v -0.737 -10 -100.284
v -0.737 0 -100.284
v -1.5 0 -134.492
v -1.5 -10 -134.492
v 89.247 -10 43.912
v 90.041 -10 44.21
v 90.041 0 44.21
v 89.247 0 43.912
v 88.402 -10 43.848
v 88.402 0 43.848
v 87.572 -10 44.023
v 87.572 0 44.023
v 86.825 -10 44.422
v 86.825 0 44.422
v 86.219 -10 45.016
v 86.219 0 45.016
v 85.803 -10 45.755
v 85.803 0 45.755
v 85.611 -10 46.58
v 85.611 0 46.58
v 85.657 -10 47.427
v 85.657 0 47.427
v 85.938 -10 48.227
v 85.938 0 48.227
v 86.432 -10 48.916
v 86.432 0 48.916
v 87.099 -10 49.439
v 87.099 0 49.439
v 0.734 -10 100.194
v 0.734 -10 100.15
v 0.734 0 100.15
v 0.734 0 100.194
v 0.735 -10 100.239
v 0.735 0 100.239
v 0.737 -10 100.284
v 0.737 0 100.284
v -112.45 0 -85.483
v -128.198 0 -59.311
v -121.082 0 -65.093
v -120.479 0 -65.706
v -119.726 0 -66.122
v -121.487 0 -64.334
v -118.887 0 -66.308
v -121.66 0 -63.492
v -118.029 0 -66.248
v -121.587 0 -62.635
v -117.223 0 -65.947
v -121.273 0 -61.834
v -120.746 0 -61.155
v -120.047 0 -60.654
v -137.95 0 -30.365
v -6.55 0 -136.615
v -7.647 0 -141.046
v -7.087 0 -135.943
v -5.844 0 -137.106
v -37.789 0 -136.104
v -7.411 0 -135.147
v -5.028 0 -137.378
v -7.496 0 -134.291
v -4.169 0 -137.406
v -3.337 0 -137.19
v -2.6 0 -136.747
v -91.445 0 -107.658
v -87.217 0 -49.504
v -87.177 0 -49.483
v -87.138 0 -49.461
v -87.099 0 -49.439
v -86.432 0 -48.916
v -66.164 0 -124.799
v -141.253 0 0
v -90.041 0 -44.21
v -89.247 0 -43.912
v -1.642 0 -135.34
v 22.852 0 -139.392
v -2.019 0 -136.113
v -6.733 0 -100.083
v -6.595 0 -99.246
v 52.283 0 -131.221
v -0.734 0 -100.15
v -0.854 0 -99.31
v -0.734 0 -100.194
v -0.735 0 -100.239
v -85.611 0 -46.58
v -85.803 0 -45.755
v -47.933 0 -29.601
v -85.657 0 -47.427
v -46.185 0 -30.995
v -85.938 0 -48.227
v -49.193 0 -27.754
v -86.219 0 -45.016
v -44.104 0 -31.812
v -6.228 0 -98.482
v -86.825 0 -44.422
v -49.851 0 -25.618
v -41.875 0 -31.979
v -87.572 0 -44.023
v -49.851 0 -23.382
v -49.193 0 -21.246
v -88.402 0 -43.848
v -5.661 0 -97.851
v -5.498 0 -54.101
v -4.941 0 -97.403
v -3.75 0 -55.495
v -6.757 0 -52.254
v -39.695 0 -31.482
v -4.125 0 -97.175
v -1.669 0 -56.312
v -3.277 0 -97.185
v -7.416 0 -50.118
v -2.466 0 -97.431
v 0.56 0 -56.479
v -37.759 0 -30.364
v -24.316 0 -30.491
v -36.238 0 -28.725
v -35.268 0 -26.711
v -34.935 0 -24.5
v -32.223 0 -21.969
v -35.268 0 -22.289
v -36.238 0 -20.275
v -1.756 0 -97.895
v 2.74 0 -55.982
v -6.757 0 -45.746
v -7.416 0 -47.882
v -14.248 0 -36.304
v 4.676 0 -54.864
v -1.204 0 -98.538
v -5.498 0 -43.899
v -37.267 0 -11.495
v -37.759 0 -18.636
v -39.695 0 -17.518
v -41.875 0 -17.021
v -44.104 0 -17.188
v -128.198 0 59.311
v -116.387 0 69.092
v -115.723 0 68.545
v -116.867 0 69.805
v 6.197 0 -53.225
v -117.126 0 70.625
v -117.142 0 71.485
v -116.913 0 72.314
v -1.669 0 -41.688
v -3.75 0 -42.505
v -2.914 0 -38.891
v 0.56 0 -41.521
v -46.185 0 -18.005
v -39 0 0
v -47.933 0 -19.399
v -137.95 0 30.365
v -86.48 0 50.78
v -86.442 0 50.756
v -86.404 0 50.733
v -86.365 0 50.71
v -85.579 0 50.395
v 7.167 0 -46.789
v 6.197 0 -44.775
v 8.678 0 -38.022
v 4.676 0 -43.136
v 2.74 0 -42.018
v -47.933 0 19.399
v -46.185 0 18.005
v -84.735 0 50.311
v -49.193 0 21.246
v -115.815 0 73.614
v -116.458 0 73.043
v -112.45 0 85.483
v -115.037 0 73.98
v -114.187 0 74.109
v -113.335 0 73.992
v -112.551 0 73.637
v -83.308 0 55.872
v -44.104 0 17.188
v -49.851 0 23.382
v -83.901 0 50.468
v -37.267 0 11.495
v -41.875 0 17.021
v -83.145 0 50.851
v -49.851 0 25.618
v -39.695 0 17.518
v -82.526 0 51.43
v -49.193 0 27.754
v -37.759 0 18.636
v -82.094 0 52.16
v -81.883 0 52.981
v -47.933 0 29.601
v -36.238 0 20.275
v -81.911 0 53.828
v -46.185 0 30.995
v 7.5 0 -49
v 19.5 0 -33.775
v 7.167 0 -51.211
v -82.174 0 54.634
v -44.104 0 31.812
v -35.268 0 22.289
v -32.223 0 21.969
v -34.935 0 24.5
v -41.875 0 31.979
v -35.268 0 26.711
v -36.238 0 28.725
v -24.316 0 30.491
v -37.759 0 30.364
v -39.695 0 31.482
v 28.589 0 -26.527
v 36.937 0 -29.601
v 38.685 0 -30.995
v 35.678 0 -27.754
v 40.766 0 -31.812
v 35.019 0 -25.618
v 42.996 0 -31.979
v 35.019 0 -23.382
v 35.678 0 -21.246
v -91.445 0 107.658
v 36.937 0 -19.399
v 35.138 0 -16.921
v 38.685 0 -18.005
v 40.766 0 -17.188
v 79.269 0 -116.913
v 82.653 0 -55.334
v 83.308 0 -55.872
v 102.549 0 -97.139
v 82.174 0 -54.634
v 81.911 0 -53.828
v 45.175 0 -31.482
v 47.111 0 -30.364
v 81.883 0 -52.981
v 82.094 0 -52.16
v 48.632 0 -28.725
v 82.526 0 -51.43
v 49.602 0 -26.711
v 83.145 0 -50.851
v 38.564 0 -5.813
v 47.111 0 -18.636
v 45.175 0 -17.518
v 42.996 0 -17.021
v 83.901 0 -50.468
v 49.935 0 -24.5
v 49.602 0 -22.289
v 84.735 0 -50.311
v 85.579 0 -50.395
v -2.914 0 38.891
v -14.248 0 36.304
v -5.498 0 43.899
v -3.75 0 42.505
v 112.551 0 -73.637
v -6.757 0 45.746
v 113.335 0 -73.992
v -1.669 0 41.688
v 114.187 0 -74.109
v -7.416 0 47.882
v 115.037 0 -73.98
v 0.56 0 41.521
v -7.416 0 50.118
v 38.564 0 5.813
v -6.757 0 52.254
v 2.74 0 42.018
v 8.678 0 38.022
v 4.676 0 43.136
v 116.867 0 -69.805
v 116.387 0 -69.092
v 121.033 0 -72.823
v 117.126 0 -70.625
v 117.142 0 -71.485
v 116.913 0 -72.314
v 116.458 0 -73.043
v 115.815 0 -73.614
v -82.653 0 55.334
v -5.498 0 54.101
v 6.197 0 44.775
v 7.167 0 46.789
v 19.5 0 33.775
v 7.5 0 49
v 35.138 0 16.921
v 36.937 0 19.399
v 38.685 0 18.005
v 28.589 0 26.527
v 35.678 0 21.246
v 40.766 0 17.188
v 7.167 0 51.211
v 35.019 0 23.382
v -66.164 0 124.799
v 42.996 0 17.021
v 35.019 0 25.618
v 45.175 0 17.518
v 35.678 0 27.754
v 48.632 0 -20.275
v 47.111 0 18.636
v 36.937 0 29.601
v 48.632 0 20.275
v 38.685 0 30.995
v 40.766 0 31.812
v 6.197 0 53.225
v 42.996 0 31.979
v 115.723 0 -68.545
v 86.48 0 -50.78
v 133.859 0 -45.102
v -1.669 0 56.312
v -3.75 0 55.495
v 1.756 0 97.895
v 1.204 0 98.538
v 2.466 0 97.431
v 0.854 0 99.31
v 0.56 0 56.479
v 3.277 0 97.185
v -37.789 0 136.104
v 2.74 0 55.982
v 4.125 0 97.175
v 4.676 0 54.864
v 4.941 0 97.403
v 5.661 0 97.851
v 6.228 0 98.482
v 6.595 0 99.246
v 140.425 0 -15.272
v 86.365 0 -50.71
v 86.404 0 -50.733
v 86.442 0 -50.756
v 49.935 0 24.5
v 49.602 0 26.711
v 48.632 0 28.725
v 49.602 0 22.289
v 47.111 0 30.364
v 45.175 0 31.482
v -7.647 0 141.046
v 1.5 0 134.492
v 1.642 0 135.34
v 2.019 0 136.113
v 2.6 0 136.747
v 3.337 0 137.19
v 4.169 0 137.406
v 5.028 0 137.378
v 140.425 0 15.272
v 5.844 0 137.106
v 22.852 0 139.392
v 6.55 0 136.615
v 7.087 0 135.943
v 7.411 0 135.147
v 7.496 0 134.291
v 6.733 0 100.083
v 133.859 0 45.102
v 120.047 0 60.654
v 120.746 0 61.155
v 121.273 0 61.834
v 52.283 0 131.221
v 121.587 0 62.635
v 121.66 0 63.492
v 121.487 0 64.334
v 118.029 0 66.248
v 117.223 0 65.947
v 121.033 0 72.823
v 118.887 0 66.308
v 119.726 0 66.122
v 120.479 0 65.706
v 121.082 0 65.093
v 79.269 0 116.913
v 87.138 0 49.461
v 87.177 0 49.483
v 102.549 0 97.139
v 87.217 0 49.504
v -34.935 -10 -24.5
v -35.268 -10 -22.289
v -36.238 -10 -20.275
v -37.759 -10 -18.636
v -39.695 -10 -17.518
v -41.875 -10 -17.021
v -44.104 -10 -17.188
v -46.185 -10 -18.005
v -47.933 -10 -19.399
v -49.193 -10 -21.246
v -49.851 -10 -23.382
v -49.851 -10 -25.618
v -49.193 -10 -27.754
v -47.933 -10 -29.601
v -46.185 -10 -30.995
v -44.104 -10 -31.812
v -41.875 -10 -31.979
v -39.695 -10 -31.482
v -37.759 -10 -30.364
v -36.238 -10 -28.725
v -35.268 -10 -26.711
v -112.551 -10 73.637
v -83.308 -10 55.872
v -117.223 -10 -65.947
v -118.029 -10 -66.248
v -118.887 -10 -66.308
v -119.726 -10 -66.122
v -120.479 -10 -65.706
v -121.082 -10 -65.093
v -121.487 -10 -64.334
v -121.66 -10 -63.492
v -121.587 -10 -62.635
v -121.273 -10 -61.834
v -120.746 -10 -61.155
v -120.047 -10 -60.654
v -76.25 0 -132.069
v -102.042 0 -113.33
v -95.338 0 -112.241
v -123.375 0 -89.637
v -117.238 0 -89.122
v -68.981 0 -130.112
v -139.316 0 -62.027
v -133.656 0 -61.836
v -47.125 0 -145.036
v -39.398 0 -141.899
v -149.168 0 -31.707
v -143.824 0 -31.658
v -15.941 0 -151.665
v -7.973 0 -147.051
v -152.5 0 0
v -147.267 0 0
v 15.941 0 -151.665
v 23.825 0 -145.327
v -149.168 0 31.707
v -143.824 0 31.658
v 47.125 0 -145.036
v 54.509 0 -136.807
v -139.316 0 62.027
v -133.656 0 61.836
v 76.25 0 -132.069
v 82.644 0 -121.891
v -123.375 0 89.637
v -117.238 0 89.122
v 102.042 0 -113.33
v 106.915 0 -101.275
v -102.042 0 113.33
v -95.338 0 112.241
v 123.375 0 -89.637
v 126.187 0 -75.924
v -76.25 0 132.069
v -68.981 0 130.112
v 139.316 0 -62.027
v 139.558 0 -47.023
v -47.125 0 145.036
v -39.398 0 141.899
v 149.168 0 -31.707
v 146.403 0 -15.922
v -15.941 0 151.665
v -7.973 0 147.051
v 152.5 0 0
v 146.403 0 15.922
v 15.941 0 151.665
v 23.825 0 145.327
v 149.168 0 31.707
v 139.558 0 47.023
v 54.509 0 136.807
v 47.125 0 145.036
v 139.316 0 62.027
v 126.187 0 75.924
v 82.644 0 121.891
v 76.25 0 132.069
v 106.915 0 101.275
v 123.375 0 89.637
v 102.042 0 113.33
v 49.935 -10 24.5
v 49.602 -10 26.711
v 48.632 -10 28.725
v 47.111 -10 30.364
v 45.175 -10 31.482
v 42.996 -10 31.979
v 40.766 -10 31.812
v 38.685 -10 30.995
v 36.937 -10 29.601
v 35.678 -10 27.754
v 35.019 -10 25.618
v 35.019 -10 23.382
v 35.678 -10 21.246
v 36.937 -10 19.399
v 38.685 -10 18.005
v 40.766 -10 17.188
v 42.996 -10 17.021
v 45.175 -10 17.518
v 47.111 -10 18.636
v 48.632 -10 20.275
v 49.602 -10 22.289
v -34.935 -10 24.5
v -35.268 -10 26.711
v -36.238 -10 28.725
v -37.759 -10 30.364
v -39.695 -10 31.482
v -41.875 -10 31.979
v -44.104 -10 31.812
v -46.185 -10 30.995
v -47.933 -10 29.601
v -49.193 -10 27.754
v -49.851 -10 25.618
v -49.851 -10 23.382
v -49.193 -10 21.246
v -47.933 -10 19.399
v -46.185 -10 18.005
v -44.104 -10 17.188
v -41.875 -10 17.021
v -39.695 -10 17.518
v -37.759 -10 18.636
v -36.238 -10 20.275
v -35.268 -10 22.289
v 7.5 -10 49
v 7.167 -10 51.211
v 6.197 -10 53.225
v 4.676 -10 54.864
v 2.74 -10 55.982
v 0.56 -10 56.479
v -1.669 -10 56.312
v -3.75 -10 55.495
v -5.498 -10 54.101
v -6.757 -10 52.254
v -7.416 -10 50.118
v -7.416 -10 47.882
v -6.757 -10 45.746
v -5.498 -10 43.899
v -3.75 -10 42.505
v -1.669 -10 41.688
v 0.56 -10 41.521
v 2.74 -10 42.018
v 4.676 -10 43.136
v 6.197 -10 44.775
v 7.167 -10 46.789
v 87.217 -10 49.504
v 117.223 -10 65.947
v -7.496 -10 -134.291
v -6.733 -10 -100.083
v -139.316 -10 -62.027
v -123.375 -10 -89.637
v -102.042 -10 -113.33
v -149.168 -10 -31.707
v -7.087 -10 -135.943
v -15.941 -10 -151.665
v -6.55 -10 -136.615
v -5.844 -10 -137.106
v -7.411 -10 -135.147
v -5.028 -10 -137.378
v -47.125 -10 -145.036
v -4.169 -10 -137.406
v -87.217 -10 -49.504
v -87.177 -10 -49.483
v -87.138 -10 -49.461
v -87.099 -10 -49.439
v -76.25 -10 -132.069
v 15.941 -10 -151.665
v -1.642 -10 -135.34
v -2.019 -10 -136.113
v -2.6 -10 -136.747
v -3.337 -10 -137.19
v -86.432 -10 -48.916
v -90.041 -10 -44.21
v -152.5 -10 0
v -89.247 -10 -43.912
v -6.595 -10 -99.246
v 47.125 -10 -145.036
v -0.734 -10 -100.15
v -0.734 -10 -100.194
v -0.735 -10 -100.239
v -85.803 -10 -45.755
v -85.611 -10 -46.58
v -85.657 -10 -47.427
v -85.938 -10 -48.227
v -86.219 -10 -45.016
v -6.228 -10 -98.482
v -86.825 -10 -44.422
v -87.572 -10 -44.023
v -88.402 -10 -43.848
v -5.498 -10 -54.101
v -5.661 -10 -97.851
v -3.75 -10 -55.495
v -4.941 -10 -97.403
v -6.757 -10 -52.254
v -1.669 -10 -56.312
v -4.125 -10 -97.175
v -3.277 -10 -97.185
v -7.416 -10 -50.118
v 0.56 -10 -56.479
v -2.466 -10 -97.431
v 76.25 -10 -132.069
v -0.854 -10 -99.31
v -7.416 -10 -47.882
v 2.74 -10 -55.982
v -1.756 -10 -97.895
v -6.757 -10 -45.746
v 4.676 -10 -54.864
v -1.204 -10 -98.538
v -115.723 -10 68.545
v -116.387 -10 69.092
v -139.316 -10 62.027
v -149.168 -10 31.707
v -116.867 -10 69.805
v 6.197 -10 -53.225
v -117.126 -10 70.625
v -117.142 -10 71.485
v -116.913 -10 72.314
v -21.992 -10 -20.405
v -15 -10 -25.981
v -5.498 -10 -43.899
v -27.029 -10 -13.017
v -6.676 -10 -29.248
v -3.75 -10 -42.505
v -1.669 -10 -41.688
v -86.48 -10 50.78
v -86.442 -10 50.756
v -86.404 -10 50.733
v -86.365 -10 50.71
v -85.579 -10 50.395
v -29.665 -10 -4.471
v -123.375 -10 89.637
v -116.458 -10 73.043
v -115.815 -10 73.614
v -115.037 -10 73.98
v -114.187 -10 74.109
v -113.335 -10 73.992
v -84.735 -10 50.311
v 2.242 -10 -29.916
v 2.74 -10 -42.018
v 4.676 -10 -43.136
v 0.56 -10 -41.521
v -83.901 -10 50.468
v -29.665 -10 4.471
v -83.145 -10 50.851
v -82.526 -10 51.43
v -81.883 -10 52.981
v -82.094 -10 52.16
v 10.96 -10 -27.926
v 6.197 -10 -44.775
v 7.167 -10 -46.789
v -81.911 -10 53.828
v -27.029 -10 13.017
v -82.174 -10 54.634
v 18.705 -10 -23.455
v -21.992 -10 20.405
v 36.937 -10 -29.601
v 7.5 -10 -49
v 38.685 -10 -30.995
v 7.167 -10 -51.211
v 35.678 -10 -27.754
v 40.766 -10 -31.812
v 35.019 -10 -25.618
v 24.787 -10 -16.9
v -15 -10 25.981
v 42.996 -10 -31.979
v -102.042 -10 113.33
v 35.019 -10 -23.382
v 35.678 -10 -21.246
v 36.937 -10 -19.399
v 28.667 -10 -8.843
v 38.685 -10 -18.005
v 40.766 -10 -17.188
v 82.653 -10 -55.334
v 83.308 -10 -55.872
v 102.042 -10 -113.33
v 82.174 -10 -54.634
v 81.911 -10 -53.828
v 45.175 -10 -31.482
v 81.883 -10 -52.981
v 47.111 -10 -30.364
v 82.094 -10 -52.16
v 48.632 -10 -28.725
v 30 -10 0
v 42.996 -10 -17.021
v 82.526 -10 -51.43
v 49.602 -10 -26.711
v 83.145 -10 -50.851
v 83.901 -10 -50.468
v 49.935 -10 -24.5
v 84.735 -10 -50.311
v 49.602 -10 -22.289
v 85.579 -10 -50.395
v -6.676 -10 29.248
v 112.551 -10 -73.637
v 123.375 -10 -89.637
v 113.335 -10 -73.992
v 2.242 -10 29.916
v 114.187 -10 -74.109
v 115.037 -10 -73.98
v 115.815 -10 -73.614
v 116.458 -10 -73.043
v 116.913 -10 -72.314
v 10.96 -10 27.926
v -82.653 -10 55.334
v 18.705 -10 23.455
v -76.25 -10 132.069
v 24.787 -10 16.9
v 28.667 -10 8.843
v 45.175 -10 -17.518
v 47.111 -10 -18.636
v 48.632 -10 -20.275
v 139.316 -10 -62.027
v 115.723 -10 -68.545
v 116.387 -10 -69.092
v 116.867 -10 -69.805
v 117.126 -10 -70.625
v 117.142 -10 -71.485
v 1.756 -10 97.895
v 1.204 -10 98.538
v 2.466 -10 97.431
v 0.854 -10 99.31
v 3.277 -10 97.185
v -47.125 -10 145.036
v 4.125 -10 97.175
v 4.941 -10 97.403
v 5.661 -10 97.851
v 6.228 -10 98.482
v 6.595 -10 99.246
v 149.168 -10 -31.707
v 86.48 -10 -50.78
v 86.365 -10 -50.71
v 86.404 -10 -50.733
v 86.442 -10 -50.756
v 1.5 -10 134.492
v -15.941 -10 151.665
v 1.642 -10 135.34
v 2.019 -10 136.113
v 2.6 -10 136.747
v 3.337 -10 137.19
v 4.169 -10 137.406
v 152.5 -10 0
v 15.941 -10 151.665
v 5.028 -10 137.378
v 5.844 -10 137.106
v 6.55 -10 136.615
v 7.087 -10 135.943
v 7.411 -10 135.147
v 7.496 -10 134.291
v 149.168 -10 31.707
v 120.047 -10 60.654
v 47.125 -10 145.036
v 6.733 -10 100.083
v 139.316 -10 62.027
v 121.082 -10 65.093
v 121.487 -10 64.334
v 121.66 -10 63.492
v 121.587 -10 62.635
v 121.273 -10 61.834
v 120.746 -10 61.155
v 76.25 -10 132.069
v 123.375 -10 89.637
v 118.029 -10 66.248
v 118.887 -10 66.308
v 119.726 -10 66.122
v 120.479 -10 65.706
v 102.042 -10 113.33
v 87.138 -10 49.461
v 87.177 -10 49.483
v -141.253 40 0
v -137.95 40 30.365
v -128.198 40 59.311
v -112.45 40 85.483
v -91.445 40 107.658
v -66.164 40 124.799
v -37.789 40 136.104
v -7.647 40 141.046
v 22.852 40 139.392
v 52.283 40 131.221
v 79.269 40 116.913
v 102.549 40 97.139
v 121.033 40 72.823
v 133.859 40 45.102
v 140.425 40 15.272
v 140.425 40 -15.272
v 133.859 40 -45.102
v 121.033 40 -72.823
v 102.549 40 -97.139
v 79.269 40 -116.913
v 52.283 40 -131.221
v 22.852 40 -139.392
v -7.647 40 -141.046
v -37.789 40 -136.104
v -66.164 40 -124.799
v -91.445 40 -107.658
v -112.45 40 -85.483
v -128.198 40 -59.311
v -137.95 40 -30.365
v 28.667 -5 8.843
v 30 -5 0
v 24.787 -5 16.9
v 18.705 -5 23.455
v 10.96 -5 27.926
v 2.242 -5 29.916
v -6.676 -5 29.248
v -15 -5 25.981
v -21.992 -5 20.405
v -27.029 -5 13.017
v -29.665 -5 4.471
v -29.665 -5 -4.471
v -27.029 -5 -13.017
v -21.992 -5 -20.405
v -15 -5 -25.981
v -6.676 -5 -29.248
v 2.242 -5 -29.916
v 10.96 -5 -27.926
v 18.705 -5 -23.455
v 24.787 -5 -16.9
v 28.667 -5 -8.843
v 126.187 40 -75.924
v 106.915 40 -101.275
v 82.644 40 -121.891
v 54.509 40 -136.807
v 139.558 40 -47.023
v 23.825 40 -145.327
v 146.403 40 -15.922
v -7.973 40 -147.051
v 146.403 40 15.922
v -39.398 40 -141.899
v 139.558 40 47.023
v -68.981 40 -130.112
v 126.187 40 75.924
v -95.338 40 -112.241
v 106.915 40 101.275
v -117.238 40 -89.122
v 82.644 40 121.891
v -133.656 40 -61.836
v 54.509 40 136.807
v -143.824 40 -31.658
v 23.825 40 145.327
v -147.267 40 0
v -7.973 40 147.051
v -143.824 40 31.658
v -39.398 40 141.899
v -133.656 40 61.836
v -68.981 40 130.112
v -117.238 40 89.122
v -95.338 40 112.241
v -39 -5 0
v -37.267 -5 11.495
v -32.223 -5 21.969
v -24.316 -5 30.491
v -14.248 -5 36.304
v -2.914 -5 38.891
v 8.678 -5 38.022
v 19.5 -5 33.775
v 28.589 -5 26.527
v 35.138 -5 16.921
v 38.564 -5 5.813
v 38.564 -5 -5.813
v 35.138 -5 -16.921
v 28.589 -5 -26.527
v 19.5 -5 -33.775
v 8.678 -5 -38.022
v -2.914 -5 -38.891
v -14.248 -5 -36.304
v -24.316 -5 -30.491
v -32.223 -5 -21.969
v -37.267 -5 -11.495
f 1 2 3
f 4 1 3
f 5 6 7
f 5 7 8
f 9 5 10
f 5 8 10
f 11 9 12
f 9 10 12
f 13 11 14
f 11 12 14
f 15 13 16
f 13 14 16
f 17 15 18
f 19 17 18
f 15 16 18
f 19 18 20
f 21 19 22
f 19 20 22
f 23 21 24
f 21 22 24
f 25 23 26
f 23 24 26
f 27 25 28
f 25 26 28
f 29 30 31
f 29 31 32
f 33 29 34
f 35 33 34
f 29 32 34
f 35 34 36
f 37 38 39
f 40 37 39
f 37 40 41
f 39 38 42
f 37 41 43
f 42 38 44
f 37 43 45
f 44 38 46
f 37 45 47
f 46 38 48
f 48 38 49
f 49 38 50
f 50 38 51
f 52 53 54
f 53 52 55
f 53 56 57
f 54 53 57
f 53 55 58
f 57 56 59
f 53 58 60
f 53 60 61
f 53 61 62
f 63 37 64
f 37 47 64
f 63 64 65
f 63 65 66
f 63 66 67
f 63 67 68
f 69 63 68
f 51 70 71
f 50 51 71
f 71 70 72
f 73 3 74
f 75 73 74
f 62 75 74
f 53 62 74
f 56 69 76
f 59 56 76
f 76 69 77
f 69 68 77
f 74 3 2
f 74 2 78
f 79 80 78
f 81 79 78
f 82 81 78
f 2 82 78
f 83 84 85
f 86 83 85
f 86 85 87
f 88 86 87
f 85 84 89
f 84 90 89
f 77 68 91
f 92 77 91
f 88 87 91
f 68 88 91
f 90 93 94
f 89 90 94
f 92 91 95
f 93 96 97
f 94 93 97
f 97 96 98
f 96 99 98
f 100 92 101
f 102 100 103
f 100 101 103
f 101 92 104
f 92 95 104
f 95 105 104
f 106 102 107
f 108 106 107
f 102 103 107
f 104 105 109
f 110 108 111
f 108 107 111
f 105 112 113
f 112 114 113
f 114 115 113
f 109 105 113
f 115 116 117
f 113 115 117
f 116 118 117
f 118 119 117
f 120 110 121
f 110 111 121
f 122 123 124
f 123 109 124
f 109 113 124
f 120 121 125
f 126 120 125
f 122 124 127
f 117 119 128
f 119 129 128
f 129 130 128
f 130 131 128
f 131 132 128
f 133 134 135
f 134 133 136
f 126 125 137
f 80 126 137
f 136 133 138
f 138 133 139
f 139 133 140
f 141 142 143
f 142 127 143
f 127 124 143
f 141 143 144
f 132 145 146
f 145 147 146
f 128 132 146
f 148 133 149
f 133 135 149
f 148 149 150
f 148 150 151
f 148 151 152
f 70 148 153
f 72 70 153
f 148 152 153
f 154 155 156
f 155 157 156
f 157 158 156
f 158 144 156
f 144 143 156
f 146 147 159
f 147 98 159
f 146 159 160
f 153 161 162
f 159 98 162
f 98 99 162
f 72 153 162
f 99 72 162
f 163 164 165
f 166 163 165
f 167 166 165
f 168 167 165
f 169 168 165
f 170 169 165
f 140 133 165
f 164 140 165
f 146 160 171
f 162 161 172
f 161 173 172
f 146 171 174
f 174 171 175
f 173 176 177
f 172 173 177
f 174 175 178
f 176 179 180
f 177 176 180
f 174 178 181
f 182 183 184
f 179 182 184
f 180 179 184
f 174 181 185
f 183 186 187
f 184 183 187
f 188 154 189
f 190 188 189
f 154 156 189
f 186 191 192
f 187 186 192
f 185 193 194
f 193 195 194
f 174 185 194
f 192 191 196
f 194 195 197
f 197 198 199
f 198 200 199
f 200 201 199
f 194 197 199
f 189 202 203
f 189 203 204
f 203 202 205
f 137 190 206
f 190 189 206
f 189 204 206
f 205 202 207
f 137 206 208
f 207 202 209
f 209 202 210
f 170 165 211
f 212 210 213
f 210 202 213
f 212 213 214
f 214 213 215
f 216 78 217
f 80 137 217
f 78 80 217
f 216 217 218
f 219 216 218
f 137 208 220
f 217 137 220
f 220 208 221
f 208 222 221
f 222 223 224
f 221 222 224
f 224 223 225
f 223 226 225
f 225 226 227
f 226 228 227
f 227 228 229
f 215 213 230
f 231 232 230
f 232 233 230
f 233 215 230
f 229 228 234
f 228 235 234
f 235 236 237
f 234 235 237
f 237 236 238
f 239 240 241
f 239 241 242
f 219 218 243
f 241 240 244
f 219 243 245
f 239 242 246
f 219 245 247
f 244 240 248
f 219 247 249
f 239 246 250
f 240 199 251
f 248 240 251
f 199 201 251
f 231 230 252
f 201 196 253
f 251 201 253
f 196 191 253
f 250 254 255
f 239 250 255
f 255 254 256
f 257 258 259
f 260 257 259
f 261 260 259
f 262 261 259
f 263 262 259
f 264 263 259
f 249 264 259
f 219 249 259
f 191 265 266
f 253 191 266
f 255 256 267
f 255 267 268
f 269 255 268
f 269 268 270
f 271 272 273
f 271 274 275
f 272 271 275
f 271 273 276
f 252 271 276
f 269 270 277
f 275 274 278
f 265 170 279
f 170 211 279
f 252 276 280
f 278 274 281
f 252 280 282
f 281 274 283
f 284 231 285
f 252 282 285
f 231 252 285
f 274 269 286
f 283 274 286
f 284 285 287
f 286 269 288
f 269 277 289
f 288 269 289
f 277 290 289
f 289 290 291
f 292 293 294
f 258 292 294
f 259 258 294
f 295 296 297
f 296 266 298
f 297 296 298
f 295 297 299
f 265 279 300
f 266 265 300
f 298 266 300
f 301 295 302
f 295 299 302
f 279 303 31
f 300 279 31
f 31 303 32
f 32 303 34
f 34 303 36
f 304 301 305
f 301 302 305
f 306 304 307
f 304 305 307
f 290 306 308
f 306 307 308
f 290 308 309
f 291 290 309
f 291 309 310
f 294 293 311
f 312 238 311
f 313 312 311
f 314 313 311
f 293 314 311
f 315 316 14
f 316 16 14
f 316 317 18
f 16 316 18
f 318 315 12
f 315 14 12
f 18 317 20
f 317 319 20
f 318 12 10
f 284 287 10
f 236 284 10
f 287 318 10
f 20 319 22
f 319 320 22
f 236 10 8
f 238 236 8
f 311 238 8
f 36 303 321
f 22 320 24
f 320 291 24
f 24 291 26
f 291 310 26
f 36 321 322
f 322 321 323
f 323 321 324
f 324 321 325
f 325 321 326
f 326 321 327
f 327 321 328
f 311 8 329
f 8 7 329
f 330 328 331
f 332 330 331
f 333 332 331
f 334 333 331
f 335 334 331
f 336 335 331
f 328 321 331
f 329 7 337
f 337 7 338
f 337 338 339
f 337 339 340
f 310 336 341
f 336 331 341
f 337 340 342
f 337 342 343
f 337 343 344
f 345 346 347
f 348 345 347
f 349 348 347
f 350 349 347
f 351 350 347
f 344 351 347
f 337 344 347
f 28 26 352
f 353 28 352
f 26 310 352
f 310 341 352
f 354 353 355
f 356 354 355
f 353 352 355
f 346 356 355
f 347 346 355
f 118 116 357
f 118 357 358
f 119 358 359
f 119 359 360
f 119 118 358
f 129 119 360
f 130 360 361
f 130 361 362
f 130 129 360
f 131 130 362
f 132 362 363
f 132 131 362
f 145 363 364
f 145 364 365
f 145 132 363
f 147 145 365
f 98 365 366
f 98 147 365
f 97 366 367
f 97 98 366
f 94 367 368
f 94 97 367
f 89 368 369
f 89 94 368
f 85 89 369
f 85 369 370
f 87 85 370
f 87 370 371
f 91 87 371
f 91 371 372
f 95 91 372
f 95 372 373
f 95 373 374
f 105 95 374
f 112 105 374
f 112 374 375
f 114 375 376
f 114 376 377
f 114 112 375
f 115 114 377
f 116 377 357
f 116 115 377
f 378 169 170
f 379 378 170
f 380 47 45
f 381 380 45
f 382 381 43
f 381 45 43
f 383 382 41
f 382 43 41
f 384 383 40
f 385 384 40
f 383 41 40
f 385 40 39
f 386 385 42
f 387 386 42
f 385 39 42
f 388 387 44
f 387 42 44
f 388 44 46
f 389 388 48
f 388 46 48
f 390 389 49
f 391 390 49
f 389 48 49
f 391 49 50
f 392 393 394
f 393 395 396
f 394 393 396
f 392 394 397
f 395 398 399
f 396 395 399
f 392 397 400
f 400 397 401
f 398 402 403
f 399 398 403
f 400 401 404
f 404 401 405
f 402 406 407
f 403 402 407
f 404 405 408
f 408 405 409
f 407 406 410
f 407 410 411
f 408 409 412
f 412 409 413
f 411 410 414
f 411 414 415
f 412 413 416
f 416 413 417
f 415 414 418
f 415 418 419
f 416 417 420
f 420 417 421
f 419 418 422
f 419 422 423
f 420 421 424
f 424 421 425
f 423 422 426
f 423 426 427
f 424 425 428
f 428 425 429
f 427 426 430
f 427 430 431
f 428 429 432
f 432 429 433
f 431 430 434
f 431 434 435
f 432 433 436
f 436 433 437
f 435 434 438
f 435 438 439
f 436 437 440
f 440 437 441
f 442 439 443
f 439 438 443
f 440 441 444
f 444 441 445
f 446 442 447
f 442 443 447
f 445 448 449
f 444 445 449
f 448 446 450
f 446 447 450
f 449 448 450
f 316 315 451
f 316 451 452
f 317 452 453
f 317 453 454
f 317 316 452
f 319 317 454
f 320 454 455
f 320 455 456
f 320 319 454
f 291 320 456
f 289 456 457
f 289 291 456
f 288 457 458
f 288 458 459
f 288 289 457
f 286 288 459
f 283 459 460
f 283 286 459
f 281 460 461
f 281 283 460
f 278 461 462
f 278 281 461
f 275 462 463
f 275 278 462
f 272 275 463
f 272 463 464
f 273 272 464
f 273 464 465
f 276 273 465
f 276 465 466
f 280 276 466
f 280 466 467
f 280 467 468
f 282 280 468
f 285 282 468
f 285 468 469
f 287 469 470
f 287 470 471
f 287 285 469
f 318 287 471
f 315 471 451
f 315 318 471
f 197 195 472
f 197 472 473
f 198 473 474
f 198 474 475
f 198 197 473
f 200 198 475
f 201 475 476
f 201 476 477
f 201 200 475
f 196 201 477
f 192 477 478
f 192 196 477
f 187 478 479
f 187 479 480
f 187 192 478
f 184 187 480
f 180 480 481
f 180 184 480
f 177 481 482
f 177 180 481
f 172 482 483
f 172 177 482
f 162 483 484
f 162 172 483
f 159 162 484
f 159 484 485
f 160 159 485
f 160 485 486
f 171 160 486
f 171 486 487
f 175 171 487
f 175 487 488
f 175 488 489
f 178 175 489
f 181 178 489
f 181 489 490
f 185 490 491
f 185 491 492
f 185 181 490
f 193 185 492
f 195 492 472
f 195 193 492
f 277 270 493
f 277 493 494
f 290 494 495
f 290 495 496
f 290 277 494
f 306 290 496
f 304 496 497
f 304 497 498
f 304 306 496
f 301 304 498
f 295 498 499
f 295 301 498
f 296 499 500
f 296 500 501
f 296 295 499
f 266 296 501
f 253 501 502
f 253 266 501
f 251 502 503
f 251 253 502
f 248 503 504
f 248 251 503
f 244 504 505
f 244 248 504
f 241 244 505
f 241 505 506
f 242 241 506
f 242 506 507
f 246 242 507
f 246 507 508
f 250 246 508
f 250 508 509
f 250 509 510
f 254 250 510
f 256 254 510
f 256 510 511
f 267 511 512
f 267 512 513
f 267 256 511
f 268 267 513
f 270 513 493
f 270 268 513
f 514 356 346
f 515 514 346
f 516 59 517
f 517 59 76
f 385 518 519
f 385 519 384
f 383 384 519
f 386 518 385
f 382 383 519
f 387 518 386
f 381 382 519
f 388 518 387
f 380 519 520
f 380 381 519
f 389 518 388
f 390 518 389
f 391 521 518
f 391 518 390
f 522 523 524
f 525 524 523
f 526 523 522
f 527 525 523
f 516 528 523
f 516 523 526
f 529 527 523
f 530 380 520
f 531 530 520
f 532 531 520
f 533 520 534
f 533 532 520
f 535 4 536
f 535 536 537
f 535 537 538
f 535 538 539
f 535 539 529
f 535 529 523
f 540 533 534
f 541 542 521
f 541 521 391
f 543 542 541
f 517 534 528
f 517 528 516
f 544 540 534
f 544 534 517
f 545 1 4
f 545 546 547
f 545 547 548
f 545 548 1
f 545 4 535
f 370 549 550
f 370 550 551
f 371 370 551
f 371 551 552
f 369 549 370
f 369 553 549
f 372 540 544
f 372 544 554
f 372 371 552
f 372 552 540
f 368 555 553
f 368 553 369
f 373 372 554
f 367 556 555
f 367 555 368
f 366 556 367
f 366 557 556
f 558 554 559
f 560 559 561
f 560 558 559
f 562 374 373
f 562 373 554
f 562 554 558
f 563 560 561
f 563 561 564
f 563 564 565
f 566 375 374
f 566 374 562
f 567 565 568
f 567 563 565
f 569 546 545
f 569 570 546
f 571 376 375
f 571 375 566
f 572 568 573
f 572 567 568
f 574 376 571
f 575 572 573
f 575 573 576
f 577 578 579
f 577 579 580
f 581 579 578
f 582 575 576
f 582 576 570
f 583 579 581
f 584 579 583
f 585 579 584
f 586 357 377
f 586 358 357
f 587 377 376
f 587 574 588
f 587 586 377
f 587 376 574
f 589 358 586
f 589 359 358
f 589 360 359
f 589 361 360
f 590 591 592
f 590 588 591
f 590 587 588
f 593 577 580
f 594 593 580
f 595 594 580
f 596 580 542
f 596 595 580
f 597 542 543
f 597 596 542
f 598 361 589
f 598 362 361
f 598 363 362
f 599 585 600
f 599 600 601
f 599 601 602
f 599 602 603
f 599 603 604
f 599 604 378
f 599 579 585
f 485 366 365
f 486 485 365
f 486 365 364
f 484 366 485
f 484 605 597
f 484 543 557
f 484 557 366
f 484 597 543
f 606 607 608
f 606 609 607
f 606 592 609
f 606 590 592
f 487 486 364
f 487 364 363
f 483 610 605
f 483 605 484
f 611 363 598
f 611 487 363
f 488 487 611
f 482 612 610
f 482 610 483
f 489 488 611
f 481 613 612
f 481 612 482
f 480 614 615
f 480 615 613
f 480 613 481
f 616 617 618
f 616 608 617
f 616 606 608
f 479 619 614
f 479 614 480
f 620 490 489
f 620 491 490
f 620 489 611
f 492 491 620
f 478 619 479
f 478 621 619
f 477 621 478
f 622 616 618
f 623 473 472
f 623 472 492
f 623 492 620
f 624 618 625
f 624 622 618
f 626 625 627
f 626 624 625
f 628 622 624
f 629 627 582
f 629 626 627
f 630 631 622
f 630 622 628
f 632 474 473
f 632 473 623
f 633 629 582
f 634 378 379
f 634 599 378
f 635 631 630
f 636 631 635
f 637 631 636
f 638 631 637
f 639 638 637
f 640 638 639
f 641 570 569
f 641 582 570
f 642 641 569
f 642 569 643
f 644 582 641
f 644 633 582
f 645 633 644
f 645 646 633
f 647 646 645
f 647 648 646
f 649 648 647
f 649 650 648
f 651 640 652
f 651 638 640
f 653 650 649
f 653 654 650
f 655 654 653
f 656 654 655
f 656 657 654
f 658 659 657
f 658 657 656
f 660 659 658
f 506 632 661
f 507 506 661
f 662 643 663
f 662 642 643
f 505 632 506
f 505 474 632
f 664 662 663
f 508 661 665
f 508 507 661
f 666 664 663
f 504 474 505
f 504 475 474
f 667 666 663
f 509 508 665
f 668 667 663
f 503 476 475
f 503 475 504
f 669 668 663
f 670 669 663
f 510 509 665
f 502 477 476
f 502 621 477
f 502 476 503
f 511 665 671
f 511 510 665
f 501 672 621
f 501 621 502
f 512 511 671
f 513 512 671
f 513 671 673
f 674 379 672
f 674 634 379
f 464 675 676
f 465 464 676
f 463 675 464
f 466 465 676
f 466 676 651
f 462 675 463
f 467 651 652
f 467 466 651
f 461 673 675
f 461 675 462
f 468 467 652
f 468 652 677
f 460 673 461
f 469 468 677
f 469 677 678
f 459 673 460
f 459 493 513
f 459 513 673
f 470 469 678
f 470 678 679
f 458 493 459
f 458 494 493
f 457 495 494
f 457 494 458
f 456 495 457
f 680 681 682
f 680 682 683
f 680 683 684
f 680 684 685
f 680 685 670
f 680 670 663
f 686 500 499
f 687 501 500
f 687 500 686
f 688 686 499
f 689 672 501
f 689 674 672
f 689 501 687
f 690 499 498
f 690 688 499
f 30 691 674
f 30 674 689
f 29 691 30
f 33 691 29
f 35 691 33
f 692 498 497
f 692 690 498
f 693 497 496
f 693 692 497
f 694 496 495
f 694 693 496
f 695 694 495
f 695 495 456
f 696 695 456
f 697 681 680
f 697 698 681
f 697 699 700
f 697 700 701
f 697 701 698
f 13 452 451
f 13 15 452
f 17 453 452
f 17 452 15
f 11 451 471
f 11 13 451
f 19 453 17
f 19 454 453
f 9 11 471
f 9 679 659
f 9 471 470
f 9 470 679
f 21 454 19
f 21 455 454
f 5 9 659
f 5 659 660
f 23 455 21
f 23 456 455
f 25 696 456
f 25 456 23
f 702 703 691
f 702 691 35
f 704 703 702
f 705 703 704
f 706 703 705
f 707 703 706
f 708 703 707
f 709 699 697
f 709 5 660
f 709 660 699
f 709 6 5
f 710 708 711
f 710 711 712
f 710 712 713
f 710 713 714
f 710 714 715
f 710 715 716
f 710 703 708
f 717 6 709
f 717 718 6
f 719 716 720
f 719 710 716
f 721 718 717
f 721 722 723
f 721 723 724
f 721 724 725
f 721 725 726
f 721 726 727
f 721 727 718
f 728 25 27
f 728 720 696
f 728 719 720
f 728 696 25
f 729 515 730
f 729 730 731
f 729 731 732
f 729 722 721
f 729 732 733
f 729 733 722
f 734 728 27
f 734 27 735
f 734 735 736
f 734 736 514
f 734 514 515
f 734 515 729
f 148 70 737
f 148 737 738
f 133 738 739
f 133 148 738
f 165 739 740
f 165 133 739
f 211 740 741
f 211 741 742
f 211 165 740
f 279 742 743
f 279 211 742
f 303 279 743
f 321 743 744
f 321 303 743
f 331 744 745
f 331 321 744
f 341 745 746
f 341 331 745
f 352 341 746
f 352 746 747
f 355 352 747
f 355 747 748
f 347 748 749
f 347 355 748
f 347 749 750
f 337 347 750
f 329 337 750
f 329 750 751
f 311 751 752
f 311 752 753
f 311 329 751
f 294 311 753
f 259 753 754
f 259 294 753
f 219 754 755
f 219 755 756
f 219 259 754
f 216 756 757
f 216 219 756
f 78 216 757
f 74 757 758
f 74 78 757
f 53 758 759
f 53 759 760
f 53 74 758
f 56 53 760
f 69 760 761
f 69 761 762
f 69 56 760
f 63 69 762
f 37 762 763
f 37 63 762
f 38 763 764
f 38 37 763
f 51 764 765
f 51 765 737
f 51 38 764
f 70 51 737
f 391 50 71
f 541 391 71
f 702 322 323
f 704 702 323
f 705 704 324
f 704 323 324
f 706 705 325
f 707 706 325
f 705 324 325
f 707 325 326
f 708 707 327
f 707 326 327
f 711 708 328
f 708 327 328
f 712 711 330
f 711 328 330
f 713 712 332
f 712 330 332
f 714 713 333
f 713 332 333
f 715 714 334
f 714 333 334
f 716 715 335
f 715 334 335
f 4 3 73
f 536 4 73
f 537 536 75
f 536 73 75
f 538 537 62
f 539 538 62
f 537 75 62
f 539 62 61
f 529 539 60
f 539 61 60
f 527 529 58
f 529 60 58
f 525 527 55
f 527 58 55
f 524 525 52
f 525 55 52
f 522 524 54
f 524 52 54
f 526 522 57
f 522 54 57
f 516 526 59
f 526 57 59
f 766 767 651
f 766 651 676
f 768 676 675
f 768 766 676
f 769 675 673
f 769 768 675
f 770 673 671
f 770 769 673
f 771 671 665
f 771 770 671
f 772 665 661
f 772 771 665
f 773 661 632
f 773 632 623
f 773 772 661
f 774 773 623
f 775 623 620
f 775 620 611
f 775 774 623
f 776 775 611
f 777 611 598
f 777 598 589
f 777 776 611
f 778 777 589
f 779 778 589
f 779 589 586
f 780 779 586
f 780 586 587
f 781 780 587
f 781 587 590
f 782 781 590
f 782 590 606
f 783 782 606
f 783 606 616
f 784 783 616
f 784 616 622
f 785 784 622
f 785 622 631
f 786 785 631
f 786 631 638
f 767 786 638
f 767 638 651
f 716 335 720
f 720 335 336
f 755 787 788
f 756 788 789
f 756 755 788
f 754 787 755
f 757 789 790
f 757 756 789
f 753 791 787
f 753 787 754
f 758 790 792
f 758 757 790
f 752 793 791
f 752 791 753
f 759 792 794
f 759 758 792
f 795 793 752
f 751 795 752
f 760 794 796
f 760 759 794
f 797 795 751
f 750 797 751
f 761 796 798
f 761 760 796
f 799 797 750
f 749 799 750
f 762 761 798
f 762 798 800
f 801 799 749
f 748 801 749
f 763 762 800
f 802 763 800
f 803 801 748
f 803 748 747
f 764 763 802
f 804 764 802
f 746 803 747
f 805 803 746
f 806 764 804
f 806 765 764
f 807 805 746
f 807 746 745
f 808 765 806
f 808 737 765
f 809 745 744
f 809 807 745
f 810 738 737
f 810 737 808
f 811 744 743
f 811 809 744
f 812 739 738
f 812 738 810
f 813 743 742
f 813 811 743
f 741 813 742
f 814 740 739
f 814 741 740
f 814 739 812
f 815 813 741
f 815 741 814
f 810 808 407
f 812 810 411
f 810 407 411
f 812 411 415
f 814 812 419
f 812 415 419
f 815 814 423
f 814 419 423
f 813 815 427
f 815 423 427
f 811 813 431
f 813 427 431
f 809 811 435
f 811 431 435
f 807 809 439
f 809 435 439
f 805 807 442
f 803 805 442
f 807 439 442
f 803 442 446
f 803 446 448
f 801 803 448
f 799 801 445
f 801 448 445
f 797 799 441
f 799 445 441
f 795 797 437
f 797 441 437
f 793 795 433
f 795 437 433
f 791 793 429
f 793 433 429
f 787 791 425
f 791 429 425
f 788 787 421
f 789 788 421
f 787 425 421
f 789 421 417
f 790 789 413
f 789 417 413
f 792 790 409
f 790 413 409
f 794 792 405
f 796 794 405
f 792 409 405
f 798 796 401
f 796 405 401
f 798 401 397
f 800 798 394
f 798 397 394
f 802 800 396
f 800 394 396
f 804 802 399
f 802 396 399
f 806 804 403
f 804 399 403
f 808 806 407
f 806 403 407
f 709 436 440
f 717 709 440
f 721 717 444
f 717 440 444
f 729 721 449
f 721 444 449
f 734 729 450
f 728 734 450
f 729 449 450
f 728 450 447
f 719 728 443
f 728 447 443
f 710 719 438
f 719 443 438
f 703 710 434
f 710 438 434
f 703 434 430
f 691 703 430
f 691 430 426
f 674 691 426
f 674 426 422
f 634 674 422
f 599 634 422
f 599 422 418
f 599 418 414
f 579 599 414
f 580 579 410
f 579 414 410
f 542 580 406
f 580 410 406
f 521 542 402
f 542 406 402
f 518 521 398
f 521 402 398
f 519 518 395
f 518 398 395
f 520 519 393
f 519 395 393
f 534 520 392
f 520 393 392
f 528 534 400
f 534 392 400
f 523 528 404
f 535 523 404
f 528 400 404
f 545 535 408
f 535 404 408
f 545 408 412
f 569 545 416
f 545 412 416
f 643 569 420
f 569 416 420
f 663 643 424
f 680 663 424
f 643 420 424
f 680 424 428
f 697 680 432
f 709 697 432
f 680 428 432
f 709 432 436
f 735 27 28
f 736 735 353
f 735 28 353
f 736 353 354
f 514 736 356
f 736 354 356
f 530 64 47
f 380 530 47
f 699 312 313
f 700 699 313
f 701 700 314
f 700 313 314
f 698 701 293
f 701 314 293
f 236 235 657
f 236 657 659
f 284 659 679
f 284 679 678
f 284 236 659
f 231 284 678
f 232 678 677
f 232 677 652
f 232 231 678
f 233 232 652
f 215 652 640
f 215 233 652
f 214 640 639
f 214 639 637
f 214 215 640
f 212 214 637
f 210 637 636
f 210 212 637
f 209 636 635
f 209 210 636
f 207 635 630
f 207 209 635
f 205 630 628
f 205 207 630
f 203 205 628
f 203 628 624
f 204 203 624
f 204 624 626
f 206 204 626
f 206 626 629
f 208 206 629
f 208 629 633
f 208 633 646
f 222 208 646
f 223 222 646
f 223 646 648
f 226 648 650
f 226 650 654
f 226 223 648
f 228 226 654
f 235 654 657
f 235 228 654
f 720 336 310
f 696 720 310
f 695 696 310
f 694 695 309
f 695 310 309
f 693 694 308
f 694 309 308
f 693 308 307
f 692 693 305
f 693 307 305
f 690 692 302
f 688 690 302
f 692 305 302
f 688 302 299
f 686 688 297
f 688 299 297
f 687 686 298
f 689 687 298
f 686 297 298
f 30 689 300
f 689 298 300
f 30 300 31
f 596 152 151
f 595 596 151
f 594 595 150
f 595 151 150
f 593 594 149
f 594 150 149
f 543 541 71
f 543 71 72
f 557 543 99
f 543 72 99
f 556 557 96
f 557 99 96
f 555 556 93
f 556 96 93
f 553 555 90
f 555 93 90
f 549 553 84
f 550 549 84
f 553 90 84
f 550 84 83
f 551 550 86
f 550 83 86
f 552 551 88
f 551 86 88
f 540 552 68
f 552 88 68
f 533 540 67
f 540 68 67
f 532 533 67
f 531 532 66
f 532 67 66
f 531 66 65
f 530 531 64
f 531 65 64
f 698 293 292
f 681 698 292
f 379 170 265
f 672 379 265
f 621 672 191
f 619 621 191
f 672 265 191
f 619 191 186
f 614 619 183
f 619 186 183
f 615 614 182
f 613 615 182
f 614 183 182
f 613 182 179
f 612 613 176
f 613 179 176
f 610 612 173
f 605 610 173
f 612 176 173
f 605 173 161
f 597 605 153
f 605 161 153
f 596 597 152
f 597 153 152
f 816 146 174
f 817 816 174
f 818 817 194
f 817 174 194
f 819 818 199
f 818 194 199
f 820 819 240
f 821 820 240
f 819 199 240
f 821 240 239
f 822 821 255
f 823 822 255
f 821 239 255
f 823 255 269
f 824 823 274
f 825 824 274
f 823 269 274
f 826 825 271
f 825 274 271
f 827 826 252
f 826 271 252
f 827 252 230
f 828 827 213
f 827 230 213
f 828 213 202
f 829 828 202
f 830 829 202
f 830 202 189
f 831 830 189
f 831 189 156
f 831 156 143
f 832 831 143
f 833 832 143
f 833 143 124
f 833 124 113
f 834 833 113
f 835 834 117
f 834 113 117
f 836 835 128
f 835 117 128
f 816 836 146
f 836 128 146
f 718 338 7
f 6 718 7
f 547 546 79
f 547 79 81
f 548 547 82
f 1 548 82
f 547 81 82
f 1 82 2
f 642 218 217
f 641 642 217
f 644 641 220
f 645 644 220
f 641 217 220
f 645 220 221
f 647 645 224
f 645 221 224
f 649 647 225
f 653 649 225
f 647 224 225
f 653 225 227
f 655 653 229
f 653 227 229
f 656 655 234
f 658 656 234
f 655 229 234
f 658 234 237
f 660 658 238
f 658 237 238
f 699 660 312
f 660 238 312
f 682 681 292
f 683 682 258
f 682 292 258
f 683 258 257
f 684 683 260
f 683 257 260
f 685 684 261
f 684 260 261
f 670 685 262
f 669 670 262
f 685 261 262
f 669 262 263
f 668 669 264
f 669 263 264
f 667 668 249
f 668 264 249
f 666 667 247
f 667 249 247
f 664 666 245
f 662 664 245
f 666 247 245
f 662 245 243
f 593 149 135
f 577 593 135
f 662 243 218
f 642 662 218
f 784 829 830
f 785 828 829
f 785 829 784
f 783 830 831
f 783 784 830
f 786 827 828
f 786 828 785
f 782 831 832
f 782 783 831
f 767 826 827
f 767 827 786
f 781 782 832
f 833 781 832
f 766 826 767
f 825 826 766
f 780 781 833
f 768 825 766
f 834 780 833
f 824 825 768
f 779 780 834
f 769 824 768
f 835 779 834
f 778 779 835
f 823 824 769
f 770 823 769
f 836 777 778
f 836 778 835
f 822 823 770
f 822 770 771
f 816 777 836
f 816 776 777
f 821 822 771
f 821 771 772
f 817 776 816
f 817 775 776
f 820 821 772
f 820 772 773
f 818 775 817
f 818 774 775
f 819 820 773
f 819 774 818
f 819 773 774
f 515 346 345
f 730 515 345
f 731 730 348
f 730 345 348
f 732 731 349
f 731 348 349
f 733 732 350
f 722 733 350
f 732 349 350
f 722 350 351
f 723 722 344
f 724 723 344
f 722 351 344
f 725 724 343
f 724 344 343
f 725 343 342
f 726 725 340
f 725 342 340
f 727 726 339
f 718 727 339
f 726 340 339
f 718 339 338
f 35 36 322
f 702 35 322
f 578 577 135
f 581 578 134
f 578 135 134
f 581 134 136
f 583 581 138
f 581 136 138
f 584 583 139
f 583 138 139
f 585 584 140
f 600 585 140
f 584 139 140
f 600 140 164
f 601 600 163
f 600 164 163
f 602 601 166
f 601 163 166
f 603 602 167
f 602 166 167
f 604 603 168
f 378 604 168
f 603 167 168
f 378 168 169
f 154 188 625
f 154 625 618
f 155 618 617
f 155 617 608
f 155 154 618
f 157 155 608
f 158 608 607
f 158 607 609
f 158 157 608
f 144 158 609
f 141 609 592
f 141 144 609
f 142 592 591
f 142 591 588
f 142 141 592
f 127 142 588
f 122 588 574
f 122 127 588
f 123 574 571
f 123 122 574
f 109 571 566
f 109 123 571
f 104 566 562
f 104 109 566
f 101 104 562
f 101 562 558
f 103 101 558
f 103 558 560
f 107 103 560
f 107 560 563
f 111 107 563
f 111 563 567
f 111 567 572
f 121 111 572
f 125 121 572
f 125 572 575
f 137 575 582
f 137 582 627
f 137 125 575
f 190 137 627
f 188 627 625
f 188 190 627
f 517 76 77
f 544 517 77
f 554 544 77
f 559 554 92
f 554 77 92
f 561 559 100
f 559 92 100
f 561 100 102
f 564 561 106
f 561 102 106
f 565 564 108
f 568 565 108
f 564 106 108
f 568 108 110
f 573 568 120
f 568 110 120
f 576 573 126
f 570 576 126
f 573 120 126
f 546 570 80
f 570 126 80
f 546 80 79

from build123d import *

# Parameters (mm, degrees)
F0_R     = 152.5
F0_R_2   = 7.5
F0_R_3   = 30
F1_DEPTH = 10
F2_R     = 147.266784
F2_R_2   = 141.252776
F3_DEPTH = 40
F4_R     = 39
F5_DEPTH = 5


with BuildPart() as f1:
    # F0 (on Front) → F1 (new body)
    with BuildSketch(Plane.XZ):
        Circle(F0_R)
        with BuildLine():
            ThreePointArc((-1.5, -134.491635), (-4.599609, -137.423046), (-7.496269, -134.290938))
            Line((-7.496269, -134.290938), (-6.733122, -100.082887))
            ThreePointArc((-6.733122, -100.082887), (-3.700411, -97.149984), (-0.733868, -100.149798))
            ThreePointArc((-0.733868, -100.149798), (-0.734614, -100.216708), (-0.736853, -100.283585))
            Line((-0.736853, -100.283585), (-1.5, -134.491635))
        make_face(mode=Mode.SUBTRACT)
        with BuildLine():
            ThreePointArc((-117.223173, -65.94678), (-121.311653, -64.728145), (-120.047498, -60.653509))
            Line((-120.047498, -60.653509), (-90.040884, -44.210389))
            ThreePointArc((-90.040884, -44.210389), (-85.98456, -45.370342), (-87.099203, -49.43935))
            ThreePointArc((-87.099203, -49.43935), (-87.157522, -49.472159), (-87.216559, -49.503659))
            Line((-87.216559, -49.503659), (-117.223173, -65.94678))
        make_face(mode=Mode.SUBTRACT)
        with Locations((-42.435245, -24.5)):
            Circle(F0_R_2, mode=Mode.SUBTRACT)
        with Locations((0, -49)):
            Circle(F0_R_2, mode=Mode.SUBTRACT)
        with Locations((42.435245, -24.5)):
            Circle(F0_R_2, mode=Mode.SUBTRACT)
        with BuildLine():
            ThreePointArc((115.723173, -68.544856), (116.712045, -72.694901), (112.551229, -73.637428))
            Line((112.551229, -73.637428), (83.307762, -55.872498))
            ThreePointArc((83.307762, -55.872498), (82.284149, -51.779642), (86.365335, -50.710447))
            ThreePointArc((86.365335, -50.710447), (86.422908, -50.744549), (86.479706, -50.779926))
            Line((86.479706, -50.779926), (115.723173, -68.544856))
        make_face(mode=Mode.SUBTRACT)
        with BuildLine():
            ThreePointArc((-115.723173, 68.544856), (-116.712045, 72.694901), (-112.551229, 73.637428))
            Line((-112.551229, 73.637428), (-83.307762, 55.872498))
            ThreePointArc((-83.307762, 55.872498), (-82.284149, 51.779642), (-86.365335, 50.710447))
            ThreePointArc((-86.365335, 50.710447), (-86.422908, 50.744549), (-86.479706, 50.779926))
            Line((-86.479706, 50.779926), (-115.723173, 68.544856))
        make_face(mode=Mode.SUBTRACT)
        with Locations((-42.435245, 24.5)):
            Circle(F0_R_2, mode=Mode.SUBTRACT)
        Circle(F0_R_3, mode=Mode.SUBTRACT)
        with Locations((42.435245, 24.5)):
            Circle(F0_R_2, mode=Mode.SUBTRACT)
        with Locations((0, 49)):
            Circle(F0_R_2, mode=Mode.SUBTRACT)
        with BuildLine():
            ThreePointArc((117.223173, 65.94678), (121.311653, 64.728145), (120.047498, 60.653509))
            Line((120.047498, 60.653509), (90.040884, 44.210389))
            ThreePointArc((90.040884, 44.210389), (85.98456, 45.370342), (87.099203, 49.43935))
            ThreePointArc((87.099203, 49.43935), (87.157522, 49.472159), (87.216559, 49.503659))
            Line((87.216559, 49.503659), (117.223173, 65.94678))
        make_face(mode=Mode.SUBTRACT)
        with BuildLine():
            ThreePointArc((1.5, 134.491635), (4.599609, 137.423046), (7.496269, 134.290938))
            Line((7.496269, 134.290938), (6.733122, 100.082887))
            ThreePointArc((6.733122, 100.082887), (3.700411, 97.149984), (0.733868, 100.149798))
            ThreePointArc((0.733868, 100.149798), (0.734614, 100.216708), (0.736853, 100.283585))
            Line((0.736853, 100.283585), (1.5, 134.491635))
        make_face(mode=Mode.SUBTRACT)
    extrude(amount=F1_DEPTH)

    # F2 (on face) → F3 (join)
    with BuildSketch(Plane(origin=(0, 0, 0), x_dir=(-1, 0, 0), z_dir=(0, 1, 0))):
        Circle(F2_R)
        Circle(F2_R_2, mode=Mode.SUBTRACT)
    extrude(amount=F3_DEPTH)

    # F4 (on face) → F5 (cut)
    with BuildSketch(Plane(origin=(0, 0, 0), x_dir=(-1, 0, 0), z_dir=(0, 1, 0))):
        Circle(F4_R)
    extrude(amount=-F5_DEPTH, mode=Mode.SUBTRACT)


solid = f1.part
